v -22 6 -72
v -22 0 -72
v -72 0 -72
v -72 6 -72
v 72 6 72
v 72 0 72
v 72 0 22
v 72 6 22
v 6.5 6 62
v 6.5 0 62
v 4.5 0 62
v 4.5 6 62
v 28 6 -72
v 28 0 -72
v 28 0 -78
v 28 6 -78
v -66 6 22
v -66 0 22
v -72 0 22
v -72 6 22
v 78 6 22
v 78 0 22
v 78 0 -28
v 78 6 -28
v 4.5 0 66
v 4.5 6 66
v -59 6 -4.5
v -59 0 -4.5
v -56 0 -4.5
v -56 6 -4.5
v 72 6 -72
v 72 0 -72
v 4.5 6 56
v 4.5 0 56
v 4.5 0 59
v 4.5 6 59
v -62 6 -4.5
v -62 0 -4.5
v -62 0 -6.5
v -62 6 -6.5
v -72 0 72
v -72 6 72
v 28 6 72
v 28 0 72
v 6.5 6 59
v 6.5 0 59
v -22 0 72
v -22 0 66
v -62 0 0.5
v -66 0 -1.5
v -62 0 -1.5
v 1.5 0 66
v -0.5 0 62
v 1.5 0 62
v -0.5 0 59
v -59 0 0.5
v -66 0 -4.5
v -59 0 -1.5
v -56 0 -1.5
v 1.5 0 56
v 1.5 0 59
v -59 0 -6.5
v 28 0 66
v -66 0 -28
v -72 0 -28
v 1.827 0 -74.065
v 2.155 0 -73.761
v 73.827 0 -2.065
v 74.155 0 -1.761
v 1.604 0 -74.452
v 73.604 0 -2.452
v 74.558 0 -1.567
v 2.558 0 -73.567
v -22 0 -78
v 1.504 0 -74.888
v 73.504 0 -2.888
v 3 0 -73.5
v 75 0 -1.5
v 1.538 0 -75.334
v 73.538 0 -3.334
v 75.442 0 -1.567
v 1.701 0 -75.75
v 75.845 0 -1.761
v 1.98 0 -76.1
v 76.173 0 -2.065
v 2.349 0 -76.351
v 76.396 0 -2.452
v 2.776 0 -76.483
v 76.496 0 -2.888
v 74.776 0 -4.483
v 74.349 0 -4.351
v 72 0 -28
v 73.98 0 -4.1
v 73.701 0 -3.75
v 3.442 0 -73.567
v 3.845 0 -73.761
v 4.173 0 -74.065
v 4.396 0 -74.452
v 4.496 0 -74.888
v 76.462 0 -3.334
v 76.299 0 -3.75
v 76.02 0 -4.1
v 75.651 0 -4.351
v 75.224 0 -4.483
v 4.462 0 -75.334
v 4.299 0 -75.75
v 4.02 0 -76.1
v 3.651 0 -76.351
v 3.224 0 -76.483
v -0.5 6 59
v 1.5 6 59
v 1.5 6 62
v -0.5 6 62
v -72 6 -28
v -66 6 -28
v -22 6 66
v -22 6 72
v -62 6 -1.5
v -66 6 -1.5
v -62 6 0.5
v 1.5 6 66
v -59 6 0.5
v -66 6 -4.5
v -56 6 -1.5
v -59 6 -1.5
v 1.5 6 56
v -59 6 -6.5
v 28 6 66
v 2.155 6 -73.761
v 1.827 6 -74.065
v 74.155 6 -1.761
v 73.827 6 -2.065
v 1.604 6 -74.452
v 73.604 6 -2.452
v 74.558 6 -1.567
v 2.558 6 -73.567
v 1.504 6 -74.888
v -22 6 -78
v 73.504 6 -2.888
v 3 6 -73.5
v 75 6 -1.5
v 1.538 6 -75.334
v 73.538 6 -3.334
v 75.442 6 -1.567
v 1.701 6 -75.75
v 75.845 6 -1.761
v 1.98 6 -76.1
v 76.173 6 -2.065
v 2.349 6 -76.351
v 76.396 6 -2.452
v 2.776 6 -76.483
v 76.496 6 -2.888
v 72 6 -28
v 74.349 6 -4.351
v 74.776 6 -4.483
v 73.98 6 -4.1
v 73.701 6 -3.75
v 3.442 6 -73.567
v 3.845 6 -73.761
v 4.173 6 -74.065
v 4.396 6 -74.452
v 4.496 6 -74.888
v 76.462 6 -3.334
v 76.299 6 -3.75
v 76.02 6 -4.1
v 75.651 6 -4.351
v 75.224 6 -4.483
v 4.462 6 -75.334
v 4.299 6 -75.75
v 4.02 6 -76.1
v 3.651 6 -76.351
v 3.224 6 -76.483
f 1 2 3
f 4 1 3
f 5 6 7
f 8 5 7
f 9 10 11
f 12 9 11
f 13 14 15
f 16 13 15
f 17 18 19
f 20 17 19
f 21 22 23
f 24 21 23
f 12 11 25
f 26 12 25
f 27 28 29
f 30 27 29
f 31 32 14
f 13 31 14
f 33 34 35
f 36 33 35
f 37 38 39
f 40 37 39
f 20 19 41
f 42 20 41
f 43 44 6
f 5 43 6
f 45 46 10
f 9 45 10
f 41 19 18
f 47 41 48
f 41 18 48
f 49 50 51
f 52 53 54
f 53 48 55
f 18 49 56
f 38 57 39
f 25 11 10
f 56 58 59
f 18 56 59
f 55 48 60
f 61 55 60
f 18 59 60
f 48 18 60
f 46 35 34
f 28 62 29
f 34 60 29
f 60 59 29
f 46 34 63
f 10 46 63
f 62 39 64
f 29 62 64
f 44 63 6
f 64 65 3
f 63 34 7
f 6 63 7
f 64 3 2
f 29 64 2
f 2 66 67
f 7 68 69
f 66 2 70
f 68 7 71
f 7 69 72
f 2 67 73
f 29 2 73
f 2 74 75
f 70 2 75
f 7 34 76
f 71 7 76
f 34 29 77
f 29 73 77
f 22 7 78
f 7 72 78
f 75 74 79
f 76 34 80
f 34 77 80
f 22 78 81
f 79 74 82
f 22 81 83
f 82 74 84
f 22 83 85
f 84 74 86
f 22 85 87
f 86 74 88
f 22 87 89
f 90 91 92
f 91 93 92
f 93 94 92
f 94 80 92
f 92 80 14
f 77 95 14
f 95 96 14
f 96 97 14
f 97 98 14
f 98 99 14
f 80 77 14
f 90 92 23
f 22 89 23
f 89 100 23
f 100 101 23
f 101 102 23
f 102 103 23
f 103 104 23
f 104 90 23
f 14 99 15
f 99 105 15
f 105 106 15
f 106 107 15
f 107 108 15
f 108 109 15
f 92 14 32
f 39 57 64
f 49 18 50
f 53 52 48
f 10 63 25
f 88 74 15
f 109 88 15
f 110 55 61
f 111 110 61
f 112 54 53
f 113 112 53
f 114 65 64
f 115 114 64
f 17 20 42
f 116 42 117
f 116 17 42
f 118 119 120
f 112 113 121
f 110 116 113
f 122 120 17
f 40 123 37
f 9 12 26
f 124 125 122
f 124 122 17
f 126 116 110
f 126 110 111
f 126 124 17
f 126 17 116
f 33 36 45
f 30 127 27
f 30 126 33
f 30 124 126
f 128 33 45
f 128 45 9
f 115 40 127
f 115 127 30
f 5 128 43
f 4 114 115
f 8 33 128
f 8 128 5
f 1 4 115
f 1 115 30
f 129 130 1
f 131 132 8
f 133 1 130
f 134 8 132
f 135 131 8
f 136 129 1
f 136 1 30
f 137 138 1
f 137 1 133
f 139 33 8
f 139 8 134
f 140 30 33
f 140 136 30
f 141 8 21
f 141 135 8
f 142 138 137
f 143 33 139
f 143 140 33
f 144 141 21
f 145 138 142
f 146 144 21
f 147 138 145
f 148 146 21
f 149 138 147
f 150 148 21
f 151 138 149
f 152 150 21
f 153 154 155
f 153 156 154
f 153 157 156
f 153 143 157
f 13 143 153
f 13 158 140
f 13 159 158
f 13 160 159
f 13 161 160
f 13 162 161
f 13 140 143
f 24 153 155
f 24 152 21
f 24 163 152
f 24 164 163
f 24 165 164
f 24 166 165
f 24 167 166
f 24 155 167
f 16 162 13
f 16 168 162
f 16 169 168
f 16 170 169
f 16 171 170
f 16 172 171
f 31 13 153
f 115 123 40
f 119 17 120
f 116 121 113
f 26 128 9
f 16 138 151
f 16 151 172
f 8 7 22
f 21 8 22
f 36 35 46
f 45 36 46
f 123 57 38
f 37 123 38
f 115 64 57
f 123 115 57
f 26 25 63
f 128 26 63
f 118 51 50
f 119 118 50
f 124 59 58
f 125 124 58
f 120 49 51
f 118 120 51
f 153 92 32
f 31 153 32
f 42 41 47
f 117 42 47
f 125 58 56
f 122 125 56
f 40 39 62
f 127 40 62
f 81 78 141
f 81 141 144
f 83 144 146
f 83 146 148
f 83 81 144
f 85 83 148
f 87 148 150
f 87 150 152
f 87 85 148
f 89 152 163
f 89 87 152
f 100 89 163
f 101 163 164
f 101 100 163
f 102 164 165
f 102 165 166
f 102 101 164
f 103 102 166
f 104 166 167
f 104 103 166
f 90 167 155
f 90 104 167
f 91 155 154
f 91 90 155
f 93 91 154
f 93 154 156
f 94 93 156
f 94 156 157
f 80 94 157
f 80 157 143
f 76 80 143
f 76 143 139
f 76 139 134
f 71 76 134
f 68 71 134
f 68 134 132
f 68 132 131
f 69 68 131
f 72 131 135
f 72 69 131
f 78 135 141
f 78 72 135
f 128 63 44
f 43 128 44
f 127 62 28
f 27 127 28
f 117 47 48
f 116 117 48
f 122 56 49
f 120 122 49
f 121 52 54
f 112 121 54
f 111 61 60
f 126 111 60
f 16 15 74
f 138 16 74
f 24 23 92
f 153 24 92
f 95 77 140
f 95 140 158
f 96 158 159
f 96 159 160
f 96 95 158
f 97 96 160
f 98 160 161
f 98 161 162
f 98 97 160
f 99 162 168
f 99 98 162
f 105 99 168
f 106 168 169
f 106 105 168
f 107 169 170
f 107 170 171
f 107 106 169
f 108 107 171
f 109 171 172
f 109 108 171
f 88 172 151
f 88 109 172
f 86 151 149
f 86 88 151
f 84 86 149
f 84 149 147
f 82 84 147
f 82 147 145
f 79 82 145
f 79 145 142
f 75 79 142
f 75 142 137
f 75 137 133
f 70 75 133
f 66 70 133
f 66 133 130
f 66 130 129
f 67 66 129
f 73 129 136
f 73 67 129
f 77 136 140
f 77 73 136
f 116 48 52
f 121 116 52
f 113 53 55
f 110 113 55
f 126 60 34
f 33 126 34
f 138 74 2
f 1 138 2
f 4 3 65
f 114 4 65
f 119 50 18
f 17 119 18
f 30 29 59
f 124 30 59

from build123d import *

# Parameters (mm, degrees)
SKETCH1_R           = 1.5
BOSS_EXTRUDE1_DEPTH = 6


with BuildPart() as part:
    # Sketch1 → Boss-Extrude1 (new body)
    with BuildSketch(Plane(origin=(0, 0, 0), x_dir=(1, 0, 0), z_dir=(0, 1, 0))):
        Polygon((-72, 72), (-72, 28), (-66, 28), (-66, 4.5), (-62, 4.5), (-62, 6.5), (-59, 6.5), (-59, 4.5), (-56, 4.5), (-56, 1.5), (-59, 1.5), (-59, -0.5), (-62, -0.5), (-62, 1.5), (-66, 1.5), (-66, -22), (-72, -22), (-72, -72), (-22, -72), (-22, -66), (1.5, -66), (1.5, -62), (-0.5, -62), (-0.5, -59), (1.5, -59), (1.5, -56), (4.5, -56), (4.5, -59), (6.5, -59), (6.5, -62), (4.5, -62), (4.5, -66), (28, -66), (28, -72), (72, -72), (72, -22), (78, -22), (78, 28), (72, 28), (72, 72), (28, 72), (28, 78), (-22, 78), (-22, 72), align=None)
        with Locations(Location((3, 75, 0), (0, 0, 270))):
            Circle(SKETCH1_R, mode=Mode.SUBTRACT)
        with Locations(Location((75, 3, 0), (0, 0, 270))):
            Circle(SKETCH1_R, mode=Mode.SUBTRACT)
    extrude(amount=BOSS_EXTRUDE1_DEPTH)


solid = part.part
